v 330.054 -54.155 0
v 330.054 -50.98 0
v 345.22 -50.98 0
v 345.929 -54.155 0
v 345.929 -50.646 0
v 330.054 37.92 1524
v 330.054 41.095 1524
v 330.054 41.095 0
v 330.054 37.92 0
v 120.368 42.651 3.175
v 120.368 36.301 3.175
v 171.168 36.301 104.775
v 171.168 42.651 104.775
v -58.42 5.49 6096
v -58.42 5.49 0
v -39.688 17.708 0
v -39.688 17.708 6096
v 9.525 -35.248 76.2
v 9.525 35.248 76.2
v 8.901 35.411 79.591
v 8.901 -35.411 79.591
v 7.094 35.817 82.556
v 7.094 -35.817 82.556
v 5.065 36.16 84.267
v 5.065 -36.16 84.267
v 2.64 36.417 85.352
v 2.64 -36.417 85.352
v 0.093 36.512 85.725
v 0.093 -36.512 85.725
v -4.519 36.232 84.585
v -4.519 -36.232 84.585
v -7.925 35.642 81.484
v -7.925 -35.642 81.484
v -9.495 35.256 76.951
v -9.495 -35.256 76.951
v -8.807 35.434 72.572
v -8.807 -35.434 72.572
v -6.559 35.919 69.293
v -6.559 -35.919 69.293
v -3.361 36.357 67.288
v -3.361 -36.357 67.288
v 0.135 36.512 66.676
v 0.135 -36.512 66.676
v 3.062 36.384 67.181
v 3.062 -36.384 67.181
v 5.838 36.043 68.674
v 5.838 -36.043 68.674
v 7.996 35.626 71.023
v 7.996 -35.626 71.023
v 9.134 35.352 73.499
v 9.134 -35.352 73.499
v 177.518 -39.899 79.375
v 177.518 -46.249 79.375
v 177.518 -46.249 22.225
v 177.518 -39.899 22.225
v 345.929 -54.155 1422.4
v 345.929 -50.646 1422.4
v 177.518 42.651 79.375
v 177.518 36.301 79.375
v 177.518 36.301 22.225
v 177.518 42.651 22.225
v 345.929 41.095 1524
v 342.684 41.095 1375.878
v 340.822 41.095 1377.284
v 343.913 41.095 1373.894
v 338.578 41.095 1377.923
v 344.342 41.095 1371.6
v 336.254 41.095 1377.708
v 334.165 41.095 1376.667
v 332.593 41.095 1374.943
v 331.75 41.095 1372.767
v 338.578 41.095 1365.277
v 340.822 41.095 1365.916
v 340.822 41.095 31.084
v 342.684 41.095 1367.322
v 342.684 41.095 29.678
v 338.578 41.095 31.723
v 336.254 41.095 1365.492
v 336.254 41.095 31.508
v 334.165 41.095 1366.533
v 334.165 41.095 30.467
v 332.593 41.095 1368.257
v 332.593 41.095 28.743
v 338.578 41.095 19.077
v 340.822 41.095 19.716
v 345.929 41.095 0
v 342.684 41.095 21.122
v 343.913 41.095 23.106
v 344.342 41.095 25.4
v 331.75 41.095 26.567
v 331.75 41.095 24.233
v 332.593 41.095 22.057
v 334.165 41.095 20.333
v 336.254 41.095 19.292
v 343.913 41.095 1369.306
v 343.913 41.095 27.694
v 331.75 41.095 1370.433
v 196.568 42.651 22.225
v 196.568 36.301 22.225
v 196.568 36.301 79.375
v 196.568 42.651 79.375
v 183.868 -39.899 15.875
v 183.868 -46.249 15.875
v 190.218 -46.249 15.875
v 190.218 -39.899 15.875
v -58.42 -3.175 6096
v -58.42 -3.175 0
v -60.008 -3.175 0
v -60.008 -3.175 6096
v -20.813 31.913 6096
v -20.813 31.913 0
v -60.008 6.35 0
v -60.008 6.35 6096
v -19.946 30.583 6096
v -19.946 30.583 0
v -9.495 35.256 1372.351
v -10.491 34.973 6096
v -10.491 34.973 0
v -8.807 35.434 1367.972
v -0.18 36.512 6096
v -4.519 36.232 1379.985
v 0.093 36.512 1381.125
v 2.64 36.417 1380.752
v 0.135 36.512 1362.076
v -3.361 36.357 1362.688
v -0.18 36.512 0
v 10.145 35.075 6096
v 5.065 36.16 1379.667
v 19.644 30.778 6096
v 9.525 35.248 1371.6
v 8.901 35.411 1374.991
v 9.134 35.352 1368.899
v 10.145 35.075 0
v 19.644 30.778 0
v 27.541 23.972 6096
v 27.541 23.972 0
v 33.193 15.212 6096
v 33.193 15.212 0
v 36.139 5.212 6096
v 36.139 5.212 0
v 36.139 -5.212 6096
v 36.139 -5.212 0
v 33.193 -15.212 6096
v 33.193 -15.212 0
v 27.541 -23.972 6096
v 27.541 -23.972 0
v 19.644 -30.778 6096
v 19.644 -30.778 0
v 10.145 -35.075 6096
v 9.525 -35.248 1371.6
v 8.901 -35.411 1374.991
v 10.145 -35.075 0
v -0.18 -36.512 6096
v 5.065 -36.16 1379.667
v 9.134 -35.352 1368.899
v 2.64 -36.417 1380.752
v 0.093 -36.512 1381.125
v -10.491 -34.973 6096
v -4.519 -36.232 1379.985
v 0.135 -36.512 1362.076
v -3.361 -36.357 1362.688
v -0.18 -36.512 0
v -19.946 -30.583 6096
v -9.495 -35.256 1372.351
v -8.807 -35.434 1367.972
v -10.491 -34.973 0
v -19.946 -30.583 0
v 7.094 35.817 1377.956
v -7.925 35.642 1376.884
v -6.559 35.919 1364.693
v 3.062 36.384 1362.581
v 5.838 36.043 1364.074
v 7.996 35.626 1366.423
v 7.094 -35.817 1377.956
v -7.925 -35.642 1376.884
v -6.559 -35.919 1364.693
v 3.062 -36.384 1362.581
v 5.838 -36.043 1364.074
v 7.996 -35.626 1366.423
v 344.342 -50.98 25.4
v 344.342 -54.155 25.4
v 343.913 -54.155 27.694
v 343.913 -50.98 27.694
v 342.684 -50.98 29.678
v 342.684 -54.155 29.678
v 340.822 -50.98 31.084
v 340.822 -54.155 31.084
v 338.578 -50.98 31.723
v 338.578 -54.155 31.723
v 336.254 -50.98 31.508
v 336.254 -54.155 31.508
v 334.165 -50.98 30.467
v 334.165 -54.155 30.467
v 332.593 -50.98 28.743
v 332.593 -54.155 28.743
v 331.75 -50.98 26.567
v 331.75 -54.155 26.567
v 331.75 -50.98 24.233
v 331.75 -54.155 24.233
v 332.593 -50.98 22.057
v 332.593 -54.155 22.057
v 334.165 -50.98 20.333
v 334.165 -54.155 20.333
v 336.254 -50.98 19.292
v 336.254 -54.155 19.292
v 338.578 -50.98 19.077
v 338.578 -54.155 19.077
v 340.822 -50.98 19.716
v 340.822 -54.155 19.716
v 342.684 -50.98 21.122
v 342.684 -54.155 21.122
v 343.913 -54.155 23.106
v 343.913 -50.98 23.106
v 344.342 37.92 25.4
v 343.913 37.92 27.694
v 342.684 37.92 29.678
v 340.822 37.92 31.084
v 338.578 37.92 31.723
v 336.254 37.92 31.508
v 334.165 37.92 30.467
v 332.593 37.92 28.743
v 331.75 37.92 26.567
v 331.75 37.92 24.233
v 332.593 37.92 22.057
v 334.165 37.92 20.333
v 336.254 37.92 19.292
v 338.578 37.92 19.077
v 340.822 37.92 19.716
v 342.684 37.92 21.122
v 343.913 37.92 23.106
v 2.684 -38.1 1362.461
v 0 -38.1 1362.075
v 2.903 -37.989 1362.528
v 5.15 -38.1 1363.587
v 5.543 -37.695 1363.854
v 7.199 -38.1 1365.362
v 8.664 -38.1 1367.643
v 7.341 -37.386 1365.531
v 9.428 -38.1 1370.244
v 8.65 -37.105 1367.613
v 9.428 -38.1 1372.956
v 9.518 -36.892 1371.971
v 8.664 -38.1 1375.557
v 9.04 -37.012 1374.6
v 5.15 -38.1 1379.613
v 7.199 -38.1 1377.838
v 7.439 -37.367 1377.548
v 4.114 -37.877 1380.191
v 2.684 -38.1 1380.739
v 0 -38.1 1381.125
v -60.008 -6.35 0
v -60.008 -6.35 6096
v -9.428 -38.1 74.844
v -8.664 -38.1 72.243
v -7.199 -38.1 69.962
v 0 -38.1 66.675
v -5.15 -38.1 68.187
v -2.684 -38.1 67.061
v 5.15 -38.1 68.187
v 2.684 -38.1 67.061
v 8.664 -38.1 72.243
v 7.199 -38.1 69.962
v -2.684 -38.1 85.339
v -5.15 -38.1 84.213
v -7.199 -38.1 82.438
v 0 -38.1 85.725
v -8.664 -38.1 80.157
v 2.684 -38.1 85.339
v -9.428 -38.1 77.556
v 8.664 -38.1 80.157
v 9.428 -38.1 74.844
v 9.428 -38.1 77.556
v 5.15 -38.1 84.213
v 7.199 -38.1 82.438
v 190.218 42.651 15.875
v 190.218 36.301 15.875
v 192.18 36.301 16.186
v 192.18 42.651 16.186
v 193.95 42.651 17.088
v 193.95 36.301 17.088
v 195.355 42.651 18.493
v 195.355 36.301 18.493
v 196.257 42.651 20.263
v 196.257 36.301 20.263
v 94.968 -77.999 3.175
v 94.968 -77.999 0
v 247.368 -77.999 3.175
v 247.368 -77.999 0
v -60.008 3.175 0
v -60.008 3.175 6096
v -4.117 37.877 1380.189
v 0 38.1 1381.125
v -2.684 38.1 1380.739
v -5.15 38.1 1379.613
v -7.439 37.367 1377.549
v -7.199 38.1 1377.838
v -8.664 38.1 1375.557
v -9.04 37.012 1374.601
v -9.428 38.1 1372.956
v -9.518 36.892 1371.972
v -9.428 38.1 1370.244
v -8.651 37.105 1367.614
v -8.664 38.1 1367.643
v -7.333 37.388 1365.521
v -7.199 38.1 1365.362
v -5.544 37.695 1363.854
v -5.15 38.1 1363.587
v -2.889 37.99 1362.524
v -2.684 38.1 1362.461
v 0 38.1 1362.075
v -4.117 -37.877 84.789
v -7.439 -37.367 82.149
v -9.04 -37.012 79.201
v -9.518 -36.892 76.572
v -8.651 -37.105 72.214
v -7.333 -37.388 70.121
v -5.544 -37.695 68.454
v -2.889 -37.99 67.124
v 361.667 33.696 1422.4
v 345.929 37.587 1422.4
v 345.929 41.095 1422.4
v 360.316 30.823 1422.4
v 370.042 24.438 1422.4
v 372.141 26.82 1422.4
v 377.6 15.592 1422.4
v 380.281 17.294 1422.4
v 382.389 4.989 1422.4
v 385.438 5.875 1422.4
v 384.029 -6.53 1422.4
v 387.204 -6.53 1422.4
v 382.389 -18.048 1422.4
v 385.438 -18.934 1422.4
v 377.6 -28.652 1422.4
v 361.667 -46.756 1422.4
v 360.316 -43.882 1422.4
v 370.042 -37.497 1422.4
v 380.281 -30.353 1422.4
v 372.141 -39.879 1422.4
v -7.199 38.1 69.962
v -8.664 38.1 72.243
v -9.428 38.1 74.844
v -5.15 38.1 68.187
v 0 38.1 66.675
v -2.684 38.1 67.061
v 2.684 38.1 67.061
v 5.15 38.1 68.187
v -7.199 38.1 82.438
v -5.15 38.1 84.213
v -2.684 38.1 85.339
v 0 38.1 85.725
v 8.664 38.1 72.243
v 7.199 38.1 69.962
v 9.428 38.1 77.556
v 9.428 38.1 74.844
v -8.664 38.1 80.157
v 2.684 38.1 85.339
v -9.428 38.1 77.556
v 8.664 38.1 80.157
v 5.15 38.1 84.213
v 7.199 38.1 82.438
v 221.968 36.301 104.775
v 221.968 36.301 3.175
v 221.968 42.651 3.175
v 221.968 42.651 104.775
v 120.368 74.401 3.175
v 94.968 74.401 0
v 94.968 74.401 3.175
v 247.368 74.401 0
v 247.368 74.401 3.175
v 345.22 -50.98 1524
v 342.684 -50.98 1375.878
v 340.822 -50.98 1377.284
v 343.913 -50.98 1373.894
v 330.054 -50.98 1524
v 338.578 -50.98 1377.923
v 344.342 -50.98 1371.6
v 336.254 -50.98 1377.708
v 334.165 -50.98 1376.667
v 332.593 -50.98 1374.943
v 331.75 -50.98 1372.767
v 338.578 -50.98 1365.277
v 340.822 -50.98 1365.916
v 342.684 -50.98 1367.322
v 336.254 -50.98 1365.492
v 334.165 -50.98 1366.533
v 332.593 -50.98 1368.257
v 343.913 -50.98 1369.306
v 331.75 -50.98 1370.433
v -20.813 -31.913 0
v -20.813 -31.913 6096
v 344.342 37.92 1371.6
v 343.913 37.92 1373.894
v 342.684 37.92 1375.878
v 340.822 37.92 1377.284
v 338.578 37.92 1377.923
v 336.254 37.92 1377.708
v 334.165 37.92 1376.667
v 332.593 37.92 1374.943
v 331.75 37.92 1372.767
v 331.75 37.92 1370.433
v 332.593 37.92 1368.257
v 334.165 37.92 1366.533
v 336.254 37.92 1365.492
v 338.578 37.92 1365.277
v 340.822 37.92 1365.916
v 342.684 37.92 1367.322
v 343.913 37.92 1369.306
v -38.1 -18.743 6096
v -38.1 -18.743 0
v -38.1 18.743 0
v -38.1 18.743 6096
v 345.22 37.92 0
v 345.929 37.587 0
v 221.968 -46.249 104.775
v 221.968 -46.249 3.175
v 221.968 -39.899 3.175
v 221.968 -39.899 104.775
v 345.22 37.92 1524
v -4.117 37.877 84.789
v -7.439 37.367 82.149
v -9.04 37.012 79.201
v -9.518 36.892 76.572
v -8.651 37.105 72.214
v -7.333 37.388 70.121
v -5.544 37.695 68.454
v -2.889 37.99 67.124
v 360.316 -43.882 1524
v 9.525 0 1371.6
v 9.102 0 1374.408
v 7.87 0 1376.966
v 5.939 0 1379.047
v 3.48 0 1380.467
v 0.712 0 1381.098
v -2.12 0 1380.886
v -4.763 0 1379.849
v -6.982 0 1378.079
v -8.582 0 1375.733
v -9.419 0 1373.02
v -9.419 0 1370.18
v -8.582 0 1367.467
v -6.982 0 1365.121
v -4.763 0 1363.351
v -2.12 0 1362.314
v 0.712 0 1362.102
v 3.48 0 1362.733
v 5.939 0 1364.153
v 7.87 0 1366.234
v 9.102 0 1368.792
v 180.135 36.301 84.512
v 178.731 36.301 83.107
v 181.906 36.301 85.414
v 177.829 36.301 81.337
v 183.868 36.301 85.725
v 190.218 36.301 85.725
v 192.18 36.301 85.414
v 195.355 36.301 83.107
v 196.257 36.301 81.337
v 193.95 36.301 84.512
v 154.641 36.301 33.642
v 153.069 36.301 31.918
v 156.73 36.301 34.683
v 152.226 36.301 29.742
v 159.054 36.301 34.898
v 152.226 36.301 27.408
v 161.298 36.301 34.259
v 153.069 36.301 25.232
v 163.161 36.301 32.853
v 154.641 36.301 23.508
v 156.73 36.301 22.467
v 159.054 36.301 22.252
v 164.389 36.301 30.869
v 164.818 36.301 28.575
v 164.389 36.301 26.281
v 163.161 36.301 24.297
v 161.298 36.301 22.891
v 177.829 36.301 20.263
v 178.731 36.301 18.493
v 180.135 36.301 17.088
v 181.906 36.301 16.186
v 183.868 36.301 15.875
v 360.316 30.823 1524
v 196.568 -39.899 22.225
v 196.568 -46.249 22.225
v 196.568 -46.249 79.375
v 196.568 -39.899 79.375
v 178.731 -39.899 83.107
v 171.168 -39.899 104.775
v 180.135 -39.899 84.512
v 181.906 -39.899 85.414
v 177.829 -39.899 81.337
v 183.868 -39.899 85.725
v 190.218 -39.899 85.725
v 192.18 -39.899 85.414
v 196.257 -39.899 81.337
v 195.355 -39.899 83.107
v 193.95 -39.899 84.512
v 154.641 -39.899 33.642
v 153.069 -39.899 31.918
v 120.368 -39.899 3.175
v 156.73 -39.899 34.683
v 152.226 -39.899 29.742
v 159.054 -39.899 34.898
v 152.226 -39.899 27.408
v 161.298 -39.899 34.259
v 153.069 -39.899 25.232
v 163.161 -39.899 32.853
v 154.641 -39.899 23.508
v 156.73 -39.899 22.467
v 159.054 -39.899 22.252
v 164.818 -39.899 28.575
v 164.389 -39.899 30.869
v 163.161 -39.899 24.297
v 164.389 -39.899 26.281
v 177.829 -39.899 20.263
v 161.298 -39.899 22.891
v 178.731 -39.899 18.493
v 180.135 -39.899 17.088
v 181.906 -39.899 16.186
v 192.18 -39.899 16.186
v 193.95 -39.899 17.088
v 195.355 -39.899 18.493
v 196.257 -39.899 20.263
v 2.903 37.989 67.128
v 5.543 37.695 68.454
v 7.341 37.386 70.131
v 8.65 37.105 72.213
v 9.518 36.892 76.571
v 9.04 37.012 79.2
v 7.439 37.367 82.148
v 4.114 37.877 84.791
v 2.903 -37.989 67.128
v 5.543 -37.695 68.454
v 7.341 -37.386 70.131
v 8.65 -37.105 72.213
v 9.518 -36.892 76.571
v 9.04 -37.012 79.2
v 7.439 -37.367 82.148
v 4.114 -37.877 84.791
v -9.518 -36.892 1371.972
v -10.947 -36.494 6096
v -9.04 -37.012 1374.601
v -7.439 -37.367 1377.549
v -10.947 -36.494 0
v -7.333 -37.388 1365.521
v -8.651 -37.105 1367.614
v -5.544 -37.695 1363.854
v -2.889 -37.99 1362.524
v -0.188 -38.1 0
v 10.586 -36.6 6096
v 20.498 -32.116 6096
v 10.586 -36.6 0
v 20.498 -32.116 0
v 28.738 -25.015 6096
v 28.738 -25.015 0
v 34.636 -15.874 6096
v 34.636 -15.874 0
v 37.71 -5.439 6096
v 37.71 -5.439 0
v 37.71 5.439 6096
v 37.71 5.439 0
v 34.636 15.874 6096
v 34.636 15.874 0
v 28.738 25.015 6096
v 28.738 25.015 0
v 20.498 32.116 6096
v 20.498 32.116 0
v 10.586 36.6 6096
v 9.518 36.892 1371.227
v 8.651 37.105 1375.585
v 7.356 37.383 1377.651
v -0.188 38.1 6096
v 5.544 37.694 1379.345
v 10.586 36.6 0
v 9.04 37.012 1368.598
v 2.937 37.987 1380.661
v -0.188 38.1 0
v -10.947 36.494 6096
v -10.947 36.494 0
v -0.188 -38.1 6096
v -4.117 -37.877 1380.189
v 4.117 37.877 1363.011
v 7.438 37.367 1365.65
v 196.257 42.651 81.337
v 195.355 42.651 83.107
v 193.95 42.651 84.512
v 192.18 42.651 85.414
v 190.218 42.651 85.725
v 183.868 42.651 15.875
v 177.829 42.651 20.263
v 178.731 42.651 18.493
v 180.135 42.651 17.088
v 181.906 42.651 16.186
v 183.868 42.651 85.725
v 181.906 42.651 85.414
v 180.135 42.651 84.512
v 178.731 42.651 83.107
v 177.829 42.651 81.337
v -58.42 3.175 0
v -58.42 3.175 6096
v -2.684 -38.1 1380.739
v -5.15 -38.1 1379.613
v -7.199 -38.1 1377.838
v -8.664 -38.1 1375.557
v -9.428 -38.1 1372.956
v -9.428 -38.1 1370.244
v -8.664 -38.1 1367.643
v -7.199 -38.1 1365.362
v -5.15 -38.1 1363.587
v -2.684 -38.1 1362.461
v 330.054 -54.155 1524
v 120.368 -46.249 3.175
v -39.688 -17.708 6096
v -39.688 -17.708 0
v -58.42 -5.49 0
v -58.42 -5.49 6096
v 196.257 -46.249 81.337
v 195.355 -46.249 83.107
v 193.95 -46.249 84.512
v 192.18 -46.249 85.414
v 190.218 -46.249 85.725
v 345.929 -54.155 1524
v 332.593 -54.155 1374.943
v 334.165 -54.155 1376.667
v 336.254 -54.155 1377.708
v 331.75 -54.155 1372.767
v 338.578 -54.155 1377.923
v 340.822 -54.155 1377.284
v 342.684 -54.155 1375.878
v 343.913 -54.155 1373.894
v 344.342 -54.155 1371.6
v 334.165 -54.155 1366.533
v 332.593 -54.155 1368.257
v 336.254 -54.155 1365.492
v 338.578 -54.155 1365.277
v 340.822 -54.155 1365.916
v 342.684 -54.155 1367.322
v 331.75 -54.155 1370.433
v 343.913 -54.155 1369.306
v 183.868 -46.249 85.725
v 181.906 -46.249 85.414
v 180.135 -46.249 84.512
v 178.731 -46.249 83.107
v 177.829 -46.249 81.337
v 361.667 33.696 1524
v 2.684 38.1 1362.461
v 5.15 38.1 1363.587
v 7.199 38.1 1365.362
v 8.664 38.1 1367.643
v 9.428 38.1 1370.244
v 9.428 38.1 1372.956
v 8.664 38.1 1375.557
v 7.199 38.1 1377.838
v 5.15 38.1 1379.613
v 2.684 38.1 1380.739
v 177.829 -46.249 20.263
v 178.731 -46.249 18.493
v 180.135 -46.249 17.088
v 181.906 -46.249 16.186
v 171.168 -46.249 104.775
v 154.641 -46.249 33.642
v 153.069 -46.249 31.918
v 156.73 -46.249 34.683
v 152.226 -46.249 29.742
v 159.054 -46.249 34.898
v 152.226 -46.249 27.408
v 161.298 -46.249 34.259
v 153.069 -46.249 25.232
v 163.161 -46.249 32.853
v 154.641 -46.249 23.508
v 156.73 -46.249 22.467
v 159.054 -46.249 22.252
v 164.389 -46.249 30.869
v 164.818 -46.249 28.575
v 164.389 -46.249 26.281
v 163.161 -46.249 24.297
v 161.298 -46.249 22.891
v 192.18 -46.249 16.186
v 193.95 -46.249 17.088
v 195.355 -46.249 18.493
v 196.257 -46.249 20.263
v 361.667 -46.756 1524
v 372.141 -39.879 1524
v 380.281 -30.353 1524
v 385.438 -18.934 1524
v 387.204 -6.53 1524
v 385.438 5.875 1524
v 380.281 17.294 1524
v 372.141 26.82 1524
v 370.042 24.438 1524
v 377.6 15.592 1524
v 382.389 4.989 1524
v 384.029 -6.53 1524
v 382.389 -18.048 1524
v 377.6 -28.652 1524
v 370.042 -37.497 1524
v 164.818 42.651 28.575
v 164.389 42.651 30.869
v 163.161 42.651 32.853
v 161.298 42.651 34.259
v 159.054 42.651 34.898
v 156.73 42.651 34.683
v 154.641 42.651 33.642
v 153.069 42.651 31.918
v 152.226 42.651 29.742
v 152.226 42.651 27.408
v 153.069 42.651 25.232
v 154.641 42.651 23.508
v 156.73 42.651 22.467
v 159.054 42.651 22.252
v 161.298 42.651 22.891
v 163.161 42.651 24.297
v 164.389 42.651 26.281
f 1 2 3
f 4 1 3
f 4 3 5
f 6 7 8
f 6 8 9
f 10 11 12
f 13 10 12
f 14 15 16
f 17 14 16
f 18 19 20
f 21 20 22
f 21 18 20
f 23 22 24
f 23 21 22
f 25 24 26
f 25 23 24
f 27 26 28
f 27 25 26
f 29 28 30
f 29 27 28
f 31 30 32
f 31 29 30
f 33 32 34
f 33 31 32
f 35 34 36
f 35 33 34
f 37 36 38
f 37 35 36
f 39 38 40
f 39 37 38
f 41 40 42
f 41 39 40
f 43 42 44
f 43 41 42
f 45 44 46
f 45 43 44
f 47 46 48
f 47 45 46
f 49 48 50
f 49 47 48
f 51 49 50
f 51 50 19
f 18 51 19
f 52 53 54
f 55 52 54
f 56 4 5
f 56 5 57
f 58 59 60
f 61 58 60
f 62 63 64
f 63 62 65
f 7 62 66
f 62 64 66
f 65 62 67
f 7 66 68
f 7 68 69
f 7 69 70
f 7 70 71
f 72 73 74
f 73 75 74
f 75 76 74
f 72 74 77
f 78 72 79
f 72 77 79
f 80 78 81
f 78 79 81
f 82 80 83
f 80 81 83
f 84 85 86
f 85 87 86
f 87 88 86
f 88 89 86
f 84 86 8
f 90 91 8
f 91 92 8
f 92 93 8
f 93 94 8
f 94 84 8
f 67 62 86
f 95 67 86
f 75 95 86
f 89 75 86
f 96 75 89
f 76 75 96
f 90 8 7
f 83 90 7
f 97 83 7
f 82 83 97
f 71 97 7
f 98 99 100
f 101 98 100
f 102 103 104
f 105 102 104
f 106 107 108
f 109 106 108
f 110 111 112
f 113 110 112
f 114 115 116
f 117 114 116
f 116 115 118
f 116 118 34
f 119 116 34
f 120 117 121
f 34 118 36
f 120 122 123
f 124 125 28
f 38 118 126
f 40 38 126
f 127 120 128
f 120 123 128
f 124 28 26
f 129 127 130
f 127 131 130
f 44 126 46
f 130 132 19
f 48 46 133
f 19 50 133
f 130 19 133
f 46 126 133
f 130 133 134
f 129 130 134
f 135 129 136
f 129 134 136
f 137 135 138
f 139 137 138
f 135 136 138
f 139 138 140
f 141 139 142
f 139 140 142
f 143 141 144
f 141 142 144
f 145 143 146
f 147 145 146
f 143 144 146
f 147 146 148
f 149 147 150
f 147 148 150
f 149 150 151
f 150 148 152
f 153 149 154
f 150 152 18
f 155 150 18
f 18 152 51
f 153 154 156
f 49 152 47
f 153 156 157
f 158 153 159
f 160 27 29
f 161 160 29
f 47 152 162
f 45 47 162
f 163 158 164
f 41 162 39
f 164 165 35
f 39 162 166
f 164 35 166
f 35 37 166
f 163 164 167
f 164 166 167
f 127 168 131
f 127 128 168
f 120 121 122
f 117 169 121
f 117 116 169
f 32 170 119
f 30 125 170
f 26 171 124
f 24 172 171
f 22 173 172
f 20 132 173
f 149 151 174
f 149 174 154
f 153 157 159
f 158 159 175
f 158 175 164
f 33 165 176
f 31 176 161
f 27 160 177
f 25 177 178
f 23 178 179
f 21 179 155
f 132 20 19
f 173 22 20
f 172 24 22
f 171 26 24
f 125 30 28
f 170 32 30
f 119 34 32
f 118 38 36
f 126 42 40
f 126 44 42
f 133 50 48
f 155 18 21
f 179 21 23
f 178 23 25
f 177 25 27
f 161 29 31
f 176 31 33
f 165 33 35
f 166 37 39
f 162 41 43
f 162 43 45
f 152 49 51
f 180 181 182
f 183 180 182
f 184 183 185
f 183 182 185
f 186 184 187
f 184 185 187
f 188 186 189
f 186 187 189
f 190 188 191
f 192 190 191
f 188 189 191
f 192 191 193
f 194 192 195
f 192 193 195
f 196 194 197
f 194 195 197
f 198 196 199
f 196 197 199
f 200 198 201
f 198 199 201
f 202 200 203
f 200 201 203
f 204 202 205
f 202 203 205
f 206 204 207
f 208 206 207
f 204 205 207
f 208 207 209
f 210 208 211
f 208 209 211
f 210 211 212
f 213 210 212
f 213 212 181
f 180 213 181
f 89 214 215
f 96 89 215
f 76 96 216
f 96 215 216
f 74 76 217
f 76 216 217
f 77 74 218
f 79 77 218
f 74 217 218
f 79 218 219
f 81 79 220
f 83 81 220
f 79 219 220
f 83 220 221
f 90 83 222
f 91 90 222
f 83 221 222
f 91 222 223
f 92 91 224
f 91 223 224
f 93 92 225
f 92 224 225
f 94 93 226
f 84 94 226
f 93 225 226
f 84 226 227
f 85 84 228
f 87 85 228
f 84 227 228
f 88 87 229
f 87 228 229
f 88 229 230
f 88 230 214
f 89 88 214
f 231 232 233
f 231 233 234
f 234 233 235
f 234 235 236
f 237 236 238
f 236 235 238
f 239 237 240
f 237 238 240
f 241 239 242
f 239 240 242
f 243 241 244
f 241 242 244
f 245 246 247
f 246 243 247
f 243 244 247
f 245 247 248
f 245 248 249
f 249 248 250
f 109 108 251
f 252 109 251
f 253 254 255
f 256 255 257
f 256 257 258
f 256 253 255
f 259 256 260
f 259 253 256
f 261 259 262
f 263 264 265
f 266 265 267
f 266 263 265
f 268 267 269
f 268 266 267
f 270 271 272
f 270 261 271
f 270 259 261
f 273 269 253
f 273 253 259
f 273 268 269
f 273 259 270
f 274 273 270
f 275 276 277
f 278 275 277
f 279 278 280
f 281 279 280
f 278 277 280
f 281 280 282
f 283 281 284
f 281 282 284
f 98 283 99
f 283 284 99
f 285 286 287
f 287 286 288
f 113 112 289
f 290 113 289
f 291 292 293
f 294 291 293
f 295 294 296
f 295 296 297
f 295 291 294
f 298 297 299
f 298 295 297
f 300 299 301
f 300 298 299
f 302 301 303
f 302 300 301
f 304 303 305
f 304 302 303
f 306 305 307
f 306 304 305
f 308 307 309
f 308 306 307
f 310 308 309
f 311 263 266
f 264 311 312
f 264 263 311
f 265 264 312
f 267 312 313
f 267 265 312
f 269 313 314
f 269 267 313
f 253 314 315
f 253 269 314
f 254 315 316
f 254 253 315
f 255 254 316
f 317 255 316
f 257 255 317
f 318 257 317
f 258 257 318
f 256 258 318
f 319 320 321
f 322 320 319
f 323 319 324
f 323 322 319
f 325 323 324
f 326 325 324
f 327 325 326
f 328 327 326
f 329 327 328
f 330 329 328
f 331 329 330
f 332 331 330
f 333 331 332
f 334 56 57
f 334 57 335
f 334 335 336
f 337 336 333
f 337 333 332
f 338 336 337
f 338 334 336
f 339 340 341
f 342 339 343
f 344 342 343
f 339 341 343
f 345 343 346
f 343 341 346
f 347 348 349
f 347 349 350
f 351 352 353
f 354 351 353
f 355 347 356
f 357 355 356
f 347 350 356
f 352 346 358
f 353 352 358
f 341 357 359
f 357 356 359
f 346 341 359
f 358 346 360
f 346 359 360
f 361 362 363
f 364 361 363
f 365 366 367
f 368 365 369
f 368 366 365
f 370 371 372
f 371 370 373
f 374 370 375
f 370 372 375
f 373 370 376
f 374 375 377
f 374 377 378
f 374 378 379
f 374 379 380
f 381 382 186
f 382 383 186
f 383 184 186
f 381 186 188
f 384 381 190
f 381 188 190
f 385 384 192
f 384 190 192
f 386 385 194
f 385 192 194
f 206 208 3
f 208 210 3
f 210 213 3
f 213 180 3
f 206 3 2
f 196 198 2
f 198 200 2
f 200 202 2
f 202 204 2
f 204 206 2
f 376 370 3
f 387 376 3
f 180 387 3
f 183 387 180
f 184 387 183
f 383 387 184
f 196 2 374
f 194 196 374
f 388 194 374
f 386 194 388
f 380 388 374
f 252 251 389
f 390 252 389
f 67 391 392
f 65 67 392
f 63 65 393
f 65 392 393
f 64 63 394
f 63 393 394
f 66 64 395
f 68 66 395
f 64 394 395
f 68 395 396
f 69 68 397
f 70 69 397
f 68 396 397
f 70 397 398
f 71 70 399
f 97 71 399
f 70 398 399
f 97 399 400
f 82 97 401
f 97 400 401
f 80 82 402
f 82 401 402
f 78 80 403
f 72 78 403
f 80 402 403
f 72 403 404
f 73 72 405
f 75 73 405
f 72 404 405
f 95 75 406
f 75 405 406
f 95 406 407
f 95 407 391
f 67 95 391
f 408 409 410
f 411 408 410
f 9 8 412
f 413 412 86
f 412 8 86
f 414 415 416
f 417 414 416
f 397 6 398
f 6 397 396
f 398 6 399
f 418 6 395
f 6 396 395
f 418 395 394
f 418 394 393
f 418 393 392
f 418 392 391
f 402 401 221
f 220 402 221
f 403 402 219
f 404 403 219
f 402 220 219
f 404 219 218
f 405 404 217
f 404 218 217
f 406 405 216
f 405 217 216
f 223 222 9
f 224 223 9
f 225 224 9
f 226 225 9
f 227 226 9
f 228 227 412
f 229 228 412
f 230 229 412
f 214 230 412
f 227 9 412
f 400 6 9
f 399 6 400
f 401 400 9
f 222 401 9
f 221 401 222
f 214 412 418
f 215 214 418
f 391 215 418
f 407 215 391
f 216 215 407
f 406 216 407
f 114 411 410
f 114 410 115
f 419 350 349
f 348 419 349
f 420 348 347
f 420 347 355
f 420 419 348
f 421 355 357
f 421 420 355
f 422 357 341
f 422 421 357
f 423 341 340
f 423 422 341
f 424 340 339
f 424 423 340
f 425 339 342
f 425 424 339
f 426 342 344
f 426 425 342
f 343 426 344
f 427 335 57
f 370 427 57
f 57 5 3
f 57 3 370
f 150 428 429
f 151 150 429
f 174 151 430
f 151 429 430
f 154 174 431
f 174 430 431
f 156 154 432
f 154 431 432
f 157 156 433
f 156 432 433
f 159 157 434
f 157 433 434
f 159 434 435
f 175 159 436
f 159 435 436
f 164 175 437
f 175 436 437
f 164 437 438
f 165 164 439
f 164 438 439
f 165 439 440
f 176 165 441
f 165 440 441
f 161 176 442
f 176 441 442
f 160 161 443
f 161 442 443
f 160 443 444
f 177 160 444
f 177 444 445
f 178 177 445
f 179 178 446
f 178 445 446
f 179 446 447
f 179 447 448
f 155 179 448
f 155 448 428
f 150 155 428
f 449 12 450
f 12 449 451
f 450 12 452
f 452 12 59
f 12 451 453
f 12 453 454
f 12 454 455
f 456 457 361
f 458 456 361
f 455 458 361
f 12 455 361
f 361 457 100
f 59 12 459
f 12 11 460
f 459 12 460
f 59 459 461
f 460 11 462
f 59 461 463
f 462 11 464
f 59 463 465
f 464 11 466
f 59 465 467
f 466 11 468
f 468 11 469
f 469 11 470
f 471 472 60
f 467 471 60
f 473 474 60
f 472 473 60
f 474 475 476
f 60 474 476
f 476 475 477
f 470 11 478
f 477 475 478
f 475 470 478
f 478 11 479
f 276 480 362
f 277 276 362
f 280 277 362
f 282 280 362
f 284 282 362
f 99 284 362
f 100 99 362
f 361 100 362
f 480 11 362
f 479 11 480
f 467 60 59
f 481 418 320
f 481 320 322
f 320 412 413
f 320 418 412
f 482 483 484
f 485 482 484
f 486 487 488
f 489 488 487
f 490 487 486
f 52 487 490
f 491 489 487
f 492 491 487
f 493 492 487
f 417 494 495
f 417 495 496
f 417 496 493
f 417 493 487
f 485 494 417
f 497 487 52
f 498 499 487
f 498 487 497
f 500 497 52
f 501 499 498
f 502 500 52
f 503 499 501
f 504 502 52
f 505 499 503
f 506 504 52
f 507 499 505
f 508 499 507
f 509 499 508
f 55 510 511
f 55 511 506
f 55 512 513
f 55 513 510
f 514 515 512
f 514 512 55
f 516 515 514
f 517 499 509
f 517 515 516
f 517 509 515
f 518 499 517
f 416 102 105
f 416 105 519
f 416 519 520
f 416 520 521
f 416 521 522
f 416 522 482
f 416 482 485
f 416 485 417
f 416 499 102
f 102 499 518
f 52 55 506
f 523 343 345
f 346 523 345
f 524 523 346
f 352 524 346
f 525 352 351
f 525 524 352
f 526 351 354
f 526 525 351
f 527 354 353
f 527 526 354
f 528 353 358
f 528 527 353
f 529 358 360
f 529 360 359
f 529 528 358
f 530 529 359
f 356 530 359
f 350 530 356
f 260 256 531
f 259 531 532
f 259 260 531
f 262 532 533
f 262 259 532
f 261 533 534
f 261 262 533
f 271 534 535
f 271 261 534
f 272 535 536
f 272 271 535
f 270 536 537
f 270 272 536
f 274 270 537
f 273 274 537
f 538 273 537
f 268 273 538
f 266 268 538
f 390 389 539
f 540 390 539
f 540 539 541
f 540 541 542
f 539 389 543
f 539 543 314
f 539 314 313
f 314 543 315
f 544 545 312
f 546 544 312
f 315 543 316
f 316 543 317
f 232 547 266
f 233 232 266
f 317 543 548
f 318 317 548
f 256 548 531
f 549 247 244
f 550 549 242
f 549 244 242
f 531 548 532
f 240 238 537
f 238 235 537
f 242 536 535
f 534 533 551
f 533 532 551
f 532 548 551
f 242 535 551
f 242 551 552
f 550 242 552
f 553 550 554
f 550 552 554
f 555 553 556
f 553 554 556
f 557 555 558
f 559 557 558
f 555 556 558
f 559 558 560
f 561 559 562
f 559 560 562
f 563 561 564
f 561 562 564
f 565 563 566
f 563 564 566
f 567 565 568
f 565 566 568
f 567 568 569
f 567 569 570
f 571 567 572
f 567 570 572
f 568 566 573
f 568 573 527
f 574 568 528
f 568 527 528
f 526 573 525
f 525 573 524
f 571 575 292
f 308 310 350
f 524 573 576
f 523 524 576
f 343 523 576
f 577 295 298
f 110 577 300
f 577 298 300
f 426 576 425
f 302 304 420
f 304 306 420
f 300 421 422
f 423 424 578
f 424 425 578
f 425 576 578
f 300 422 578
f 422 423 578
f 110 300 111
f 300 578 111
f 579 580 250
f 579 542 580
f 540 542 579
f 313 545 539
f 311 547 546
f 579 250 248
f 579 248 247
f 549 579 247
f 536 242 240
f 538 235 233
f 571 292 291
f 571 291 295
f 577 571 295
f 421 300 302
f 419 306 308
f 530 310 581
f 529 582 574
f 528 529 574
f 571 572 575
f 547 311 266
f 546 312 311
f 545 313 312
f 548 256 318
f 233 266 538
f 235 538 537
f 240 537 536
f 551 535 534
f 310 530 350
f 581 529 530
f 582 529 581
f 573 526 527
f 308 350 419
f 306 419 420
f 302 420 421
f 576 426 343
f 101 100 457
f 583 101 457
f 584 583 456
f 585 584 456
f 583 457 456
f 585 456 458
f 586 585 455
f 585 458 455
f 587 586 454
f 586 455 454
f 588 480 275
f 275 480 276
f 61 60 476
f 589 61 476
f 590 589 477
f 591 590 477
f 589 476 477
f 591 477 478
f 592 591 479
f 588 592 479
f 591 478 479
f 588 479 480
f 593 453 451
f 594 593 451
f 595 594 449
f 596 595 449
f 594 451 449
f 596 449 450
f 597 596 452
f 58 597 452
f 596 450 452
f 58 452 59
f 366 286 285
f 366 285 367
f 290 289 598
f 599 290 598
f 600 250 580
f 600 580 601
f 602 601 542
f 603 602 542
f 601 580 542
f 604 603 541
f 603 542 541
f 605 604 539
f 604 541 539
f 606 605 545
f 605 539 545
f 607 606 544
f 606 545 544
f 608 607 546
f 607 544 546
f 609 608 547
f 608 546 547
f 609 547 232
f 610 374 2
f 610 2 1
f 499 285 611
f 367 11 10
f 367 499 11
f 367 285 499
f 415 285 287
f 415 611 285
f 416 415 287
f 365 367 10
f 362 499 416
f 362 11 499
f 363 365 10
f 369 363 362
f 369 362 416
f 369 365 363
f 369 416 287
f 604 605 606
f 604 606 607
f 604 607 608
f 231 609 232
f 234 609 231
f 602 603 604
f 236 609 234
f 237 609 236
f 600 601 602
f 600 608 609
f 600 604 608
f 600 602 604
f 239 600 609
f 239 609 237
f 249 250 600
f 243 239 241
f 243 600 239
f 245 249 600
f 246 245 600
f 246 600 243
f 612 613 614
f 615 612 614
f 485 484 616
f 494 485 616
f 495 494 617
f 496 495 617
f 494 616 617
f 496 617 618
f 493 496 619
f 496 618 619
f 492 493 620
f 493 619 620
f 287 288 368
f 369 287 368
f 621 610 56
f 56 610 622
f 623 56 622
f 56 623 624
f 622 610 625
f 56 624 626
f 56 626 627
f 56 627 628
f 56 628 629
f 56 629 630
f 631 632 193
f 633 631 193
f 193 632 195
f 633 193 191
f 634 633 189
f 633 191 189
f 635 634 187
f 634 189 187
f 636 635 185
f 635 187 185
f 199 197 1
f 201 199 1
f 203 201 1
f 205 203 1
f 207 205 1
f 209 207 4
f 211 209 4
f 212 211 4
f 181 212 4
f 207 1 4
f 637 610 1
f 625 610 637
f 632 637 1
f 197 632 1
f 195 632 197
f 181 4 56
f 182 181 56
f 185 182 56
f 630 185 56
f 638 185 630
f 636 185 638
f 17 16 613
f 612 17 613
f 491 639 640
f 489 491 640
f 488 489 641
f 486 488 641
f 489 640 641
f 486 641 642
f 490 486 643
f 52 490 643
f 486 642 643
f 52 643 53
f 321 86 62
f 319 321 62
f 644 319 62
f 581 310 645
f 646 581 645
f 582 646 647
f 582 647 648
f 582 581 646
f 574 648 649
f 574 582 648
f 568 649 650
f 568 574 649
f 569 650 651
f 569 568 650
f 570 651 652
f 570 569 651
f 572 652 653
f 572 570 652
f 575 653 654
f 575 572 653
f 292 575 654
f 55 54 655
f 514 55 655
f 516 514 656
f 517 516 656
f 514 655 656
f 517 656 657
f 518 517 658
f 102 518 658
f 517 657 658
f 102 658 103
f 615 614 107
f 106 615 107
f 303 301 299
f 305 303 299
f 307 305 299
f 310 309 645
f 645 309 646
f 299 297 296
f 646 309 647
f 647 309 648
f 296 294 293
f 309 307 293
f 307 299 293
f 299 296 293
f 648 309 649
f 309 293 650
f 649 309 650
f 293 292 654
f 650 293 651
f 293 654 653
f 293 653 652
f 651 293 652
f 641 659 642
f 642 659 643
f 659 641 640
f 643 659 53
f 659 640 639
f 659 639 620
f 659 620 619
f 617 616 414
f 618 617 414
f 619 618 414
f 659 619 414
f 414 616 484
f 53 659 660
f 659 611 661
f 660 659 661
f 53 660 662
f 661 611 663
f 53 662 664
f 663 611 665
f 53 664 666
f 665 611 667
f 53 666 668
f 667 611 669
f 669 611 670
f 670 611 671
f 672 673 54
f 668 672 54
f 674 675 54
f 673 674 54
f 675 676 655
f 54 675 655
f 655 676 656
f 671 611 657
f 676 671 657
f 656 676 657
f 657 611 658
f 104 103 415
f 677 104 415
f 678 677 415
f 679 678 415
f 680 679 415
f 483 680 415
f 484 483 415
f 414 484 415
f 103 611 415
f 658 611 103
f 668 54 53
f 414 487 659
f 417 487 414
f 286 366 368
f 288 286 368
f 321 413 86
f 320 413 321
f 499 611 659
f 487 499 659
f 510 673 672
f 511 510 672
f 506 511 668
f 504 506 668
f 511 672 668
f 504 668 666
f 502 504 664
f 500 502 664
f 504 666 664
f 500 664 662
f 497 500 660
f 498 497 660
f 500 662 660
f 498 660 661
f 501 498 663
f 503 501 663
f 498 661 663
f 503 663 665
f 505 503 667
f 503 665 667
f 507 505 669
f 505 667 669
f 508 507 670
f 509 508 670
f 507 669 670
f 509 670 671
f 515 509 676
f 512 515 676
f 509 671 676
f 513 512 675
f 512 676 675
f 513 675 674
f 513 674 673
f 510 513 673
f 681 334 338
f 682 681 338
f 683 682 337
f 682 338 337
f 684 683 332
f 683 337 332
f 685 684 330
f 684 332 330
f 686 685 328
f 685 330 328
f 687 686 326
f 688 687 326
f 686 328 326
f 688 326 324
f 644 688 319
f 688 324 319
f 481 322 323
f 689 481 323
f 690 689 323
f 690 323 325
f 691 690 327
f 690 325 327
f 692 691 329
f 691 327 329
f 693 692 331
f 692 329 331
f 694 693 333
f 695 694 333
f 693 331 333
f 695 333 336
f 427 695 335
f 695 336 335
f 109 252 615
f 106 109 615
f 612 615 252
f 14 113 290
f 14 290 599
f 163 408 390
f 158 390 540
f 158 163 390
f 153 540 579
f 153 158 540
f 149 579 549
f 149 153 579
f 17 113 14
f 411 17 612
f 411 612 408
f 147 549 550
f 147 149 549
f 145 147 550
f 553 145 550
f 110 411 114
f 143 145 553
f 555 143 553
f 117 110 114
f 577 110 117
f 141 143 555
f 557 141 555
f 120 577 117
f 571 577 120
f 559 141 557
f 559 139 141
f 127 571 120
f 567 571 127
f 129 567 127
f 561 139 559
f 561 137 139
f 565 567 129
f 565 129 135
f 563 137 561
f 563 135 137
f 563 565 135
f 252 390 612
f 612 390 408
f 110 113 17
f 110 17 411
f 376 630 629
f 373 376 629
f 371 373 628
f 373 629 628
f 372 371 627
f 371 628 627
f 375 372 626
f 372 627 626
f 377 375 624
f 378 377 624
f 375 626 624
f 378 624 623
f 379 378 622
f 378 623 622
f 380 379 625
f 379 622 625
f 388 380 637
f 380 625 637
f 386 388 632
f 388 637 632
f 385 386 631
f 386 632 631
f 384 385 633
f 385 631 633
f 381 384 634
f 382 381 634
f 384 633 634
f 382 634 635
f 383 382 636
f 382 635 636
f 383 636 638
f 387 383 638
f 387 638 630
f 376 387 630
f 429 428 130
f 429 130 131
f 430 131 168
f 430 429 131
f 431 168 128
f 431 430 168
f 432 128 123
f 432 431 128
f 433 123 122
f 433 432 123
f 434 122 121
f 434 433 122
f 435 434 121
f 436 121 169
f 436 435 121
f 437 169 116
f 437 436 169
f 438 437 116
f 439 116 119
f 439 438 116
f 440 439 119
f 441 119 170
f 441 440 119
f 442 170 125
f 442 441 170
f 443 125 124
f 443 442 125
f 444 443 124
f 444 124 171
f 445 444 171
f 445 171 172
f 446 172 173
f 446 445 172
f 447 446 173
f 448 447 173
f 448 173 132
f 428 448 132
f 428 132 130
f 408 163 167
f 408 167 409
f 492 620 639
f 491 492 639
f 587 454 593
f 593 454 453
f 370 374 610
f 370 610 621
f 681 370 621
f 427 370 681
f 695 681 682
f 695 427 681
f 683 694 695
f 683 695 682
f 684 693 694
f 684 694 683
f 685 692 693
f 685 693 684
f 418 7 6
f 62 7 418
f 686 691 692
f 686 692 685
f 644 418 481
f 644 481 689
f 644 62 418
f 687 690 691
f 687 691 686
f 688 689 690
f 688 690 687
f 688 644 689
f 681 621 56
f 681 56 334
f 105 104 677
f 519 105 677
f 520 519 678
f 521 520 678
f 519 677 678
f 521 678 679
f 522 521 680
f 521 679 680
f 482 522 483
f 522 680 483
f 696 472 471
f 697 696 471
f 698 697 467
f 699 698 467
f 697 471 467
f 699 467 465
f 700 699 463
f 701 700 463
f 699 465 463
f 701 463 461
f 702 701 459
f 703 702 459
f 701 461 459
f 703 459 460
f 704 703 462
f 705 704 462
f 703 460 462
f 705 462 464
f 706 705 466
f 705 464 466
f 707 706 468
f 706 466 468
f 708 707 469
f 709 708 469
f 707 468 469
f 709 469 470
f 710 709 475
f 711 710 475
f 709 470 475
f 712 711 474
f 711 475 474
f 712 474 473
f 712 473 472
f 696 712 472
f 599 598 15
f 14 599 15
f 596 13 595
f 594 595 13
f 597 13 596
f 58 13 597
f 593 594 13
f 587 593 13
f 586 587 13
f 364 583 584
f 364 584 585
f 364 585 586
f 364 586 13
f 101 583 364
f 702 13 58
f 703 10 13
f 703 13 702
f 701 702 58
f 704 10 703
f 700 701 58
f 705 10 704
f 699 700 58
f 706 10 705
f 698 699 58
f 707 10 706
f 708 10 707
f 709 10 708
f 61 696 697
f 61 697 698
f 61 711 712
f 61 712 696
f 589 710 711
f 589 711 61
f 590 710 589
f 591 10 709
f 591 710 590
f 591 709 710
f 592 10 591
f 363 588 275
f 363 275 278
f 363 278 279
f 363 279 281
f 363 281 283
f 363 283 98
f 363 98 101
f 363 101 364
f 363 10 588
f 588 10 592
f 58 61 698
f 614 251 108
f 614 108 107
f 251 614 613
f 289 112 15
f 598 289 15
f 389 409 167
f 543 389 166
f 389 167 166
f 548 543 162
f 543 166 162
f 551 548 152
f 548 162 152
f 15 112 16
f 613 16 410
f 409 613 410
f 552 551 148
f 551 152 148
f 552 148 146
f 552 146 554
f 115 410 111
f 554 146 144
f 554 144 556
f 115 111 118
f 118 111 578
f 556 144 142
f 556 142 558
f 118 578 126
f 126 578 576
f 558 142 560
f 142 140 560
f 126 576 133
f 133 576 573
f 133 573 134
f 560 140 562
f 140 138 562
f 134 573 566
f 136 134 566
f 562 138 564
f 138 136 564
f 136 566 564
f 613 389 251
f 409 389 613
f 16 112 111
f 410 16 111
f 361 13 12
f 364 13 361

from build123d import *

# Parameters (mm, degrees)
F1_DEPTH  = 6096
F2_R      = 9.525
F3_DEPTH  = 38.1
F4_W      = 152.4
F4_H      = 152.4
F5_DEPTH  = 3.175
F6_W      = 101.6
F6_H      = 6.35
F7_DEPTH  = 101.6
F8_R      = 6.35
F9_DEPTH  = 120.651
F11_DEPTH = 1524
F12_W     = 75.010199
F12_H     = 1422.4
F13_DEPTH = 128.557149
F14_R     = 6.35
F15_DEPTH = 128.557149


with BuildPart() as f1:
    # F0 (on Top) → F1 (new body)
    with BuildSketch(Plane.XY):
        with BuildLine():
            Line((-60.0075, -6.35), (-20.81349, -31.912515))
            ThreePointArc((-20.81349, -31.912515), (38.1, 0), (-20.81349, 31.912515))
            Line((-20.81349, 31.912515), (-60.0075, 6.35))
            Line((-60.0075, 6.35), (-60.0075, 3.175))
            Line((-60.0075, 3.175), (-58.42, 3.175))
            Line((-58.42, 3.175), (-58.42, 5.490076))
            Line((-58.42, 5.490076), (-39.6875, 17.7075))
            Line((-39.6875, 17.7075), (-39.6875, 0))
            Line((-39.6875, 0), (-39.6875, -17.7075))
            Line((-39.6875, -17.7075), (-58.42, -5.490076))
            Line((-58.42, -5.490076), (-58.42, -3.175))
            Line((-58.42, -3.175), (-60.0075, -3.175))
            Line((-60.0075, -3.175), (-60.0075, -6.35))
        make_face()
        with BuildLine():
            ThreePointArc((-19.946262, 30.582827), (36.5125, 0), (-19.946262, -30.582827))
            Line((-19.946262, -30.582827), (-38.1, -18.742874))
            Line((-38.1, -18.742874), (-38.1, 18.742874))
            Line((-38.1, 18.742874), (-19.946262, 30.582827))
        make_face(mode=Mode.SUBTRACT)
    extrude(amount=F1_DEPTH)

    # F2 (on Front) → F3 (join, symmetric)
    with BuildSketch(Plane.XZ):
        with Locations((0, 1371.6)):
            Circle(F2_R)
        with Locations((0, 76.2)):
            Circle(F2_R)
    extrude(amount=F3_DEPTH, both=True)


with BuildPart() as f5:
    # F4 (on Top) → F5 (new body)
    with BuildSketch(Plane.XY):
        with Locations((171.167887, -1.798608)):
            Rectangle(F4_W, F4_H)
    extrude(amount=F5_DEPTH)

    # F6 (on face) → F7 (join)
    with BuildSketch(Plane.XY.offset(3.175)):
        with Locations((171.167887, 39.476392)):
            Rectangle(F6_W, F6_H)
        with Locations((171.167887, -43.073608)):
            Rectangle(F6_W, F6_H)
    extrude(amount=F7_DEPTH)

    # F8 (on face) → F9 (cut, through all)
    with BuildSketch(Plane.XZ.offset(46.248608)):
        with BuildLine():
            Line((190.217887, 85.725), (183.867887, 85.725))
            ThreePointArc((183.867887, 85.725), (179.377759, 83.865128), (177.517887, 79.375))
            Line((177.517887, 79.375), (177.517887, 22.225))
            ThreePointArc((177.517887, 22.225), (179.377759, 17.734872), (183.867887, 15.875))
            Line((183.867887, 15.875), (190.217887, 15.875))
            ThreePointArc((190.217887, 15.875), (194.708015, 17.734872), (196.567887, 22.225))
            Line((196.567887, 22.225), (196.567887, 79.375))
            ThreePointArc((196.567887, 79.375), (194.708015, 83.865128), (190.217887, 85.725))
        make_face()
        with Locations((158.467887, 28.575)):
            Circle(F8_R)
        Polygon((120.367887, 104.775), (120.367887, 3.175), (171.167887, 104.775), align=None)
    extrude(amount=-F9_DEPTH, mode=Mode.SUBTRACT)


with BuildPart() as f11:
    # F10 (on Top) → F11 (new body)
    with BuildSketch(Plane.XY):
        with BuildLine():
            Line((330.05426, 41.095242), (330.05426, 37.920242))
            Line((330.05426, 37.920242), (345.220115, 37.920242))
            Line((345.220115, 37.920242), (360.315929, 30.822798))
            ThreePointArc((360.315929, 30.822798), (384.02926, -6.529758), (360.315929, -43.882313))
            Line((360.315929, -43.882313), (345.220115, -50.979758))
            Line((345.220115, -50.979758), (330.05426, -50.979758))
            Line((330.05426, -50.979758), (330.05426, -54.154758))
            Line((330.05426, -54.154758), (345.92926, -54.154758))
            Line((345.92926, -54.154758), (361.666827, -46.755587))
            ThreePointArc((361.666827, -46.755587), (387.20426, -6.529758), (361.666827, 33.696071))
            Line((361.666827, 33.696071), (345.92926, 41.095242))
            Line((345.92926, 41.095242), (330.05426, 41.095242))
        make_face()
    extrude(amount=F11_DEPTH)

    # F12 (on face) → F13 (cut, through all)
    with BuildSketch(Plane.XZ.offset(54.154758)):
        with Locations((383.43436, 711.2)):
            Rectangle(F12_W, F12_H)
    extrude(amount=-F13_DEPTH, mode=Mode.SUBTRACT)

    # F14 (on face) → F15 (cut, through all)
    with BuildSketch(Plane.XZ.offset(54.154758)):
        with Locations((337.99176, 1371.6)):
            Circle(F14_R)
        with Locations((337.99176, 25.4)):
            Circle(F14_R)
    extrude(amount=-F15_DEPTH, mode=Mode.SUBTRACT)


solid = Compound([f1.part, f5.part, f11.part])
